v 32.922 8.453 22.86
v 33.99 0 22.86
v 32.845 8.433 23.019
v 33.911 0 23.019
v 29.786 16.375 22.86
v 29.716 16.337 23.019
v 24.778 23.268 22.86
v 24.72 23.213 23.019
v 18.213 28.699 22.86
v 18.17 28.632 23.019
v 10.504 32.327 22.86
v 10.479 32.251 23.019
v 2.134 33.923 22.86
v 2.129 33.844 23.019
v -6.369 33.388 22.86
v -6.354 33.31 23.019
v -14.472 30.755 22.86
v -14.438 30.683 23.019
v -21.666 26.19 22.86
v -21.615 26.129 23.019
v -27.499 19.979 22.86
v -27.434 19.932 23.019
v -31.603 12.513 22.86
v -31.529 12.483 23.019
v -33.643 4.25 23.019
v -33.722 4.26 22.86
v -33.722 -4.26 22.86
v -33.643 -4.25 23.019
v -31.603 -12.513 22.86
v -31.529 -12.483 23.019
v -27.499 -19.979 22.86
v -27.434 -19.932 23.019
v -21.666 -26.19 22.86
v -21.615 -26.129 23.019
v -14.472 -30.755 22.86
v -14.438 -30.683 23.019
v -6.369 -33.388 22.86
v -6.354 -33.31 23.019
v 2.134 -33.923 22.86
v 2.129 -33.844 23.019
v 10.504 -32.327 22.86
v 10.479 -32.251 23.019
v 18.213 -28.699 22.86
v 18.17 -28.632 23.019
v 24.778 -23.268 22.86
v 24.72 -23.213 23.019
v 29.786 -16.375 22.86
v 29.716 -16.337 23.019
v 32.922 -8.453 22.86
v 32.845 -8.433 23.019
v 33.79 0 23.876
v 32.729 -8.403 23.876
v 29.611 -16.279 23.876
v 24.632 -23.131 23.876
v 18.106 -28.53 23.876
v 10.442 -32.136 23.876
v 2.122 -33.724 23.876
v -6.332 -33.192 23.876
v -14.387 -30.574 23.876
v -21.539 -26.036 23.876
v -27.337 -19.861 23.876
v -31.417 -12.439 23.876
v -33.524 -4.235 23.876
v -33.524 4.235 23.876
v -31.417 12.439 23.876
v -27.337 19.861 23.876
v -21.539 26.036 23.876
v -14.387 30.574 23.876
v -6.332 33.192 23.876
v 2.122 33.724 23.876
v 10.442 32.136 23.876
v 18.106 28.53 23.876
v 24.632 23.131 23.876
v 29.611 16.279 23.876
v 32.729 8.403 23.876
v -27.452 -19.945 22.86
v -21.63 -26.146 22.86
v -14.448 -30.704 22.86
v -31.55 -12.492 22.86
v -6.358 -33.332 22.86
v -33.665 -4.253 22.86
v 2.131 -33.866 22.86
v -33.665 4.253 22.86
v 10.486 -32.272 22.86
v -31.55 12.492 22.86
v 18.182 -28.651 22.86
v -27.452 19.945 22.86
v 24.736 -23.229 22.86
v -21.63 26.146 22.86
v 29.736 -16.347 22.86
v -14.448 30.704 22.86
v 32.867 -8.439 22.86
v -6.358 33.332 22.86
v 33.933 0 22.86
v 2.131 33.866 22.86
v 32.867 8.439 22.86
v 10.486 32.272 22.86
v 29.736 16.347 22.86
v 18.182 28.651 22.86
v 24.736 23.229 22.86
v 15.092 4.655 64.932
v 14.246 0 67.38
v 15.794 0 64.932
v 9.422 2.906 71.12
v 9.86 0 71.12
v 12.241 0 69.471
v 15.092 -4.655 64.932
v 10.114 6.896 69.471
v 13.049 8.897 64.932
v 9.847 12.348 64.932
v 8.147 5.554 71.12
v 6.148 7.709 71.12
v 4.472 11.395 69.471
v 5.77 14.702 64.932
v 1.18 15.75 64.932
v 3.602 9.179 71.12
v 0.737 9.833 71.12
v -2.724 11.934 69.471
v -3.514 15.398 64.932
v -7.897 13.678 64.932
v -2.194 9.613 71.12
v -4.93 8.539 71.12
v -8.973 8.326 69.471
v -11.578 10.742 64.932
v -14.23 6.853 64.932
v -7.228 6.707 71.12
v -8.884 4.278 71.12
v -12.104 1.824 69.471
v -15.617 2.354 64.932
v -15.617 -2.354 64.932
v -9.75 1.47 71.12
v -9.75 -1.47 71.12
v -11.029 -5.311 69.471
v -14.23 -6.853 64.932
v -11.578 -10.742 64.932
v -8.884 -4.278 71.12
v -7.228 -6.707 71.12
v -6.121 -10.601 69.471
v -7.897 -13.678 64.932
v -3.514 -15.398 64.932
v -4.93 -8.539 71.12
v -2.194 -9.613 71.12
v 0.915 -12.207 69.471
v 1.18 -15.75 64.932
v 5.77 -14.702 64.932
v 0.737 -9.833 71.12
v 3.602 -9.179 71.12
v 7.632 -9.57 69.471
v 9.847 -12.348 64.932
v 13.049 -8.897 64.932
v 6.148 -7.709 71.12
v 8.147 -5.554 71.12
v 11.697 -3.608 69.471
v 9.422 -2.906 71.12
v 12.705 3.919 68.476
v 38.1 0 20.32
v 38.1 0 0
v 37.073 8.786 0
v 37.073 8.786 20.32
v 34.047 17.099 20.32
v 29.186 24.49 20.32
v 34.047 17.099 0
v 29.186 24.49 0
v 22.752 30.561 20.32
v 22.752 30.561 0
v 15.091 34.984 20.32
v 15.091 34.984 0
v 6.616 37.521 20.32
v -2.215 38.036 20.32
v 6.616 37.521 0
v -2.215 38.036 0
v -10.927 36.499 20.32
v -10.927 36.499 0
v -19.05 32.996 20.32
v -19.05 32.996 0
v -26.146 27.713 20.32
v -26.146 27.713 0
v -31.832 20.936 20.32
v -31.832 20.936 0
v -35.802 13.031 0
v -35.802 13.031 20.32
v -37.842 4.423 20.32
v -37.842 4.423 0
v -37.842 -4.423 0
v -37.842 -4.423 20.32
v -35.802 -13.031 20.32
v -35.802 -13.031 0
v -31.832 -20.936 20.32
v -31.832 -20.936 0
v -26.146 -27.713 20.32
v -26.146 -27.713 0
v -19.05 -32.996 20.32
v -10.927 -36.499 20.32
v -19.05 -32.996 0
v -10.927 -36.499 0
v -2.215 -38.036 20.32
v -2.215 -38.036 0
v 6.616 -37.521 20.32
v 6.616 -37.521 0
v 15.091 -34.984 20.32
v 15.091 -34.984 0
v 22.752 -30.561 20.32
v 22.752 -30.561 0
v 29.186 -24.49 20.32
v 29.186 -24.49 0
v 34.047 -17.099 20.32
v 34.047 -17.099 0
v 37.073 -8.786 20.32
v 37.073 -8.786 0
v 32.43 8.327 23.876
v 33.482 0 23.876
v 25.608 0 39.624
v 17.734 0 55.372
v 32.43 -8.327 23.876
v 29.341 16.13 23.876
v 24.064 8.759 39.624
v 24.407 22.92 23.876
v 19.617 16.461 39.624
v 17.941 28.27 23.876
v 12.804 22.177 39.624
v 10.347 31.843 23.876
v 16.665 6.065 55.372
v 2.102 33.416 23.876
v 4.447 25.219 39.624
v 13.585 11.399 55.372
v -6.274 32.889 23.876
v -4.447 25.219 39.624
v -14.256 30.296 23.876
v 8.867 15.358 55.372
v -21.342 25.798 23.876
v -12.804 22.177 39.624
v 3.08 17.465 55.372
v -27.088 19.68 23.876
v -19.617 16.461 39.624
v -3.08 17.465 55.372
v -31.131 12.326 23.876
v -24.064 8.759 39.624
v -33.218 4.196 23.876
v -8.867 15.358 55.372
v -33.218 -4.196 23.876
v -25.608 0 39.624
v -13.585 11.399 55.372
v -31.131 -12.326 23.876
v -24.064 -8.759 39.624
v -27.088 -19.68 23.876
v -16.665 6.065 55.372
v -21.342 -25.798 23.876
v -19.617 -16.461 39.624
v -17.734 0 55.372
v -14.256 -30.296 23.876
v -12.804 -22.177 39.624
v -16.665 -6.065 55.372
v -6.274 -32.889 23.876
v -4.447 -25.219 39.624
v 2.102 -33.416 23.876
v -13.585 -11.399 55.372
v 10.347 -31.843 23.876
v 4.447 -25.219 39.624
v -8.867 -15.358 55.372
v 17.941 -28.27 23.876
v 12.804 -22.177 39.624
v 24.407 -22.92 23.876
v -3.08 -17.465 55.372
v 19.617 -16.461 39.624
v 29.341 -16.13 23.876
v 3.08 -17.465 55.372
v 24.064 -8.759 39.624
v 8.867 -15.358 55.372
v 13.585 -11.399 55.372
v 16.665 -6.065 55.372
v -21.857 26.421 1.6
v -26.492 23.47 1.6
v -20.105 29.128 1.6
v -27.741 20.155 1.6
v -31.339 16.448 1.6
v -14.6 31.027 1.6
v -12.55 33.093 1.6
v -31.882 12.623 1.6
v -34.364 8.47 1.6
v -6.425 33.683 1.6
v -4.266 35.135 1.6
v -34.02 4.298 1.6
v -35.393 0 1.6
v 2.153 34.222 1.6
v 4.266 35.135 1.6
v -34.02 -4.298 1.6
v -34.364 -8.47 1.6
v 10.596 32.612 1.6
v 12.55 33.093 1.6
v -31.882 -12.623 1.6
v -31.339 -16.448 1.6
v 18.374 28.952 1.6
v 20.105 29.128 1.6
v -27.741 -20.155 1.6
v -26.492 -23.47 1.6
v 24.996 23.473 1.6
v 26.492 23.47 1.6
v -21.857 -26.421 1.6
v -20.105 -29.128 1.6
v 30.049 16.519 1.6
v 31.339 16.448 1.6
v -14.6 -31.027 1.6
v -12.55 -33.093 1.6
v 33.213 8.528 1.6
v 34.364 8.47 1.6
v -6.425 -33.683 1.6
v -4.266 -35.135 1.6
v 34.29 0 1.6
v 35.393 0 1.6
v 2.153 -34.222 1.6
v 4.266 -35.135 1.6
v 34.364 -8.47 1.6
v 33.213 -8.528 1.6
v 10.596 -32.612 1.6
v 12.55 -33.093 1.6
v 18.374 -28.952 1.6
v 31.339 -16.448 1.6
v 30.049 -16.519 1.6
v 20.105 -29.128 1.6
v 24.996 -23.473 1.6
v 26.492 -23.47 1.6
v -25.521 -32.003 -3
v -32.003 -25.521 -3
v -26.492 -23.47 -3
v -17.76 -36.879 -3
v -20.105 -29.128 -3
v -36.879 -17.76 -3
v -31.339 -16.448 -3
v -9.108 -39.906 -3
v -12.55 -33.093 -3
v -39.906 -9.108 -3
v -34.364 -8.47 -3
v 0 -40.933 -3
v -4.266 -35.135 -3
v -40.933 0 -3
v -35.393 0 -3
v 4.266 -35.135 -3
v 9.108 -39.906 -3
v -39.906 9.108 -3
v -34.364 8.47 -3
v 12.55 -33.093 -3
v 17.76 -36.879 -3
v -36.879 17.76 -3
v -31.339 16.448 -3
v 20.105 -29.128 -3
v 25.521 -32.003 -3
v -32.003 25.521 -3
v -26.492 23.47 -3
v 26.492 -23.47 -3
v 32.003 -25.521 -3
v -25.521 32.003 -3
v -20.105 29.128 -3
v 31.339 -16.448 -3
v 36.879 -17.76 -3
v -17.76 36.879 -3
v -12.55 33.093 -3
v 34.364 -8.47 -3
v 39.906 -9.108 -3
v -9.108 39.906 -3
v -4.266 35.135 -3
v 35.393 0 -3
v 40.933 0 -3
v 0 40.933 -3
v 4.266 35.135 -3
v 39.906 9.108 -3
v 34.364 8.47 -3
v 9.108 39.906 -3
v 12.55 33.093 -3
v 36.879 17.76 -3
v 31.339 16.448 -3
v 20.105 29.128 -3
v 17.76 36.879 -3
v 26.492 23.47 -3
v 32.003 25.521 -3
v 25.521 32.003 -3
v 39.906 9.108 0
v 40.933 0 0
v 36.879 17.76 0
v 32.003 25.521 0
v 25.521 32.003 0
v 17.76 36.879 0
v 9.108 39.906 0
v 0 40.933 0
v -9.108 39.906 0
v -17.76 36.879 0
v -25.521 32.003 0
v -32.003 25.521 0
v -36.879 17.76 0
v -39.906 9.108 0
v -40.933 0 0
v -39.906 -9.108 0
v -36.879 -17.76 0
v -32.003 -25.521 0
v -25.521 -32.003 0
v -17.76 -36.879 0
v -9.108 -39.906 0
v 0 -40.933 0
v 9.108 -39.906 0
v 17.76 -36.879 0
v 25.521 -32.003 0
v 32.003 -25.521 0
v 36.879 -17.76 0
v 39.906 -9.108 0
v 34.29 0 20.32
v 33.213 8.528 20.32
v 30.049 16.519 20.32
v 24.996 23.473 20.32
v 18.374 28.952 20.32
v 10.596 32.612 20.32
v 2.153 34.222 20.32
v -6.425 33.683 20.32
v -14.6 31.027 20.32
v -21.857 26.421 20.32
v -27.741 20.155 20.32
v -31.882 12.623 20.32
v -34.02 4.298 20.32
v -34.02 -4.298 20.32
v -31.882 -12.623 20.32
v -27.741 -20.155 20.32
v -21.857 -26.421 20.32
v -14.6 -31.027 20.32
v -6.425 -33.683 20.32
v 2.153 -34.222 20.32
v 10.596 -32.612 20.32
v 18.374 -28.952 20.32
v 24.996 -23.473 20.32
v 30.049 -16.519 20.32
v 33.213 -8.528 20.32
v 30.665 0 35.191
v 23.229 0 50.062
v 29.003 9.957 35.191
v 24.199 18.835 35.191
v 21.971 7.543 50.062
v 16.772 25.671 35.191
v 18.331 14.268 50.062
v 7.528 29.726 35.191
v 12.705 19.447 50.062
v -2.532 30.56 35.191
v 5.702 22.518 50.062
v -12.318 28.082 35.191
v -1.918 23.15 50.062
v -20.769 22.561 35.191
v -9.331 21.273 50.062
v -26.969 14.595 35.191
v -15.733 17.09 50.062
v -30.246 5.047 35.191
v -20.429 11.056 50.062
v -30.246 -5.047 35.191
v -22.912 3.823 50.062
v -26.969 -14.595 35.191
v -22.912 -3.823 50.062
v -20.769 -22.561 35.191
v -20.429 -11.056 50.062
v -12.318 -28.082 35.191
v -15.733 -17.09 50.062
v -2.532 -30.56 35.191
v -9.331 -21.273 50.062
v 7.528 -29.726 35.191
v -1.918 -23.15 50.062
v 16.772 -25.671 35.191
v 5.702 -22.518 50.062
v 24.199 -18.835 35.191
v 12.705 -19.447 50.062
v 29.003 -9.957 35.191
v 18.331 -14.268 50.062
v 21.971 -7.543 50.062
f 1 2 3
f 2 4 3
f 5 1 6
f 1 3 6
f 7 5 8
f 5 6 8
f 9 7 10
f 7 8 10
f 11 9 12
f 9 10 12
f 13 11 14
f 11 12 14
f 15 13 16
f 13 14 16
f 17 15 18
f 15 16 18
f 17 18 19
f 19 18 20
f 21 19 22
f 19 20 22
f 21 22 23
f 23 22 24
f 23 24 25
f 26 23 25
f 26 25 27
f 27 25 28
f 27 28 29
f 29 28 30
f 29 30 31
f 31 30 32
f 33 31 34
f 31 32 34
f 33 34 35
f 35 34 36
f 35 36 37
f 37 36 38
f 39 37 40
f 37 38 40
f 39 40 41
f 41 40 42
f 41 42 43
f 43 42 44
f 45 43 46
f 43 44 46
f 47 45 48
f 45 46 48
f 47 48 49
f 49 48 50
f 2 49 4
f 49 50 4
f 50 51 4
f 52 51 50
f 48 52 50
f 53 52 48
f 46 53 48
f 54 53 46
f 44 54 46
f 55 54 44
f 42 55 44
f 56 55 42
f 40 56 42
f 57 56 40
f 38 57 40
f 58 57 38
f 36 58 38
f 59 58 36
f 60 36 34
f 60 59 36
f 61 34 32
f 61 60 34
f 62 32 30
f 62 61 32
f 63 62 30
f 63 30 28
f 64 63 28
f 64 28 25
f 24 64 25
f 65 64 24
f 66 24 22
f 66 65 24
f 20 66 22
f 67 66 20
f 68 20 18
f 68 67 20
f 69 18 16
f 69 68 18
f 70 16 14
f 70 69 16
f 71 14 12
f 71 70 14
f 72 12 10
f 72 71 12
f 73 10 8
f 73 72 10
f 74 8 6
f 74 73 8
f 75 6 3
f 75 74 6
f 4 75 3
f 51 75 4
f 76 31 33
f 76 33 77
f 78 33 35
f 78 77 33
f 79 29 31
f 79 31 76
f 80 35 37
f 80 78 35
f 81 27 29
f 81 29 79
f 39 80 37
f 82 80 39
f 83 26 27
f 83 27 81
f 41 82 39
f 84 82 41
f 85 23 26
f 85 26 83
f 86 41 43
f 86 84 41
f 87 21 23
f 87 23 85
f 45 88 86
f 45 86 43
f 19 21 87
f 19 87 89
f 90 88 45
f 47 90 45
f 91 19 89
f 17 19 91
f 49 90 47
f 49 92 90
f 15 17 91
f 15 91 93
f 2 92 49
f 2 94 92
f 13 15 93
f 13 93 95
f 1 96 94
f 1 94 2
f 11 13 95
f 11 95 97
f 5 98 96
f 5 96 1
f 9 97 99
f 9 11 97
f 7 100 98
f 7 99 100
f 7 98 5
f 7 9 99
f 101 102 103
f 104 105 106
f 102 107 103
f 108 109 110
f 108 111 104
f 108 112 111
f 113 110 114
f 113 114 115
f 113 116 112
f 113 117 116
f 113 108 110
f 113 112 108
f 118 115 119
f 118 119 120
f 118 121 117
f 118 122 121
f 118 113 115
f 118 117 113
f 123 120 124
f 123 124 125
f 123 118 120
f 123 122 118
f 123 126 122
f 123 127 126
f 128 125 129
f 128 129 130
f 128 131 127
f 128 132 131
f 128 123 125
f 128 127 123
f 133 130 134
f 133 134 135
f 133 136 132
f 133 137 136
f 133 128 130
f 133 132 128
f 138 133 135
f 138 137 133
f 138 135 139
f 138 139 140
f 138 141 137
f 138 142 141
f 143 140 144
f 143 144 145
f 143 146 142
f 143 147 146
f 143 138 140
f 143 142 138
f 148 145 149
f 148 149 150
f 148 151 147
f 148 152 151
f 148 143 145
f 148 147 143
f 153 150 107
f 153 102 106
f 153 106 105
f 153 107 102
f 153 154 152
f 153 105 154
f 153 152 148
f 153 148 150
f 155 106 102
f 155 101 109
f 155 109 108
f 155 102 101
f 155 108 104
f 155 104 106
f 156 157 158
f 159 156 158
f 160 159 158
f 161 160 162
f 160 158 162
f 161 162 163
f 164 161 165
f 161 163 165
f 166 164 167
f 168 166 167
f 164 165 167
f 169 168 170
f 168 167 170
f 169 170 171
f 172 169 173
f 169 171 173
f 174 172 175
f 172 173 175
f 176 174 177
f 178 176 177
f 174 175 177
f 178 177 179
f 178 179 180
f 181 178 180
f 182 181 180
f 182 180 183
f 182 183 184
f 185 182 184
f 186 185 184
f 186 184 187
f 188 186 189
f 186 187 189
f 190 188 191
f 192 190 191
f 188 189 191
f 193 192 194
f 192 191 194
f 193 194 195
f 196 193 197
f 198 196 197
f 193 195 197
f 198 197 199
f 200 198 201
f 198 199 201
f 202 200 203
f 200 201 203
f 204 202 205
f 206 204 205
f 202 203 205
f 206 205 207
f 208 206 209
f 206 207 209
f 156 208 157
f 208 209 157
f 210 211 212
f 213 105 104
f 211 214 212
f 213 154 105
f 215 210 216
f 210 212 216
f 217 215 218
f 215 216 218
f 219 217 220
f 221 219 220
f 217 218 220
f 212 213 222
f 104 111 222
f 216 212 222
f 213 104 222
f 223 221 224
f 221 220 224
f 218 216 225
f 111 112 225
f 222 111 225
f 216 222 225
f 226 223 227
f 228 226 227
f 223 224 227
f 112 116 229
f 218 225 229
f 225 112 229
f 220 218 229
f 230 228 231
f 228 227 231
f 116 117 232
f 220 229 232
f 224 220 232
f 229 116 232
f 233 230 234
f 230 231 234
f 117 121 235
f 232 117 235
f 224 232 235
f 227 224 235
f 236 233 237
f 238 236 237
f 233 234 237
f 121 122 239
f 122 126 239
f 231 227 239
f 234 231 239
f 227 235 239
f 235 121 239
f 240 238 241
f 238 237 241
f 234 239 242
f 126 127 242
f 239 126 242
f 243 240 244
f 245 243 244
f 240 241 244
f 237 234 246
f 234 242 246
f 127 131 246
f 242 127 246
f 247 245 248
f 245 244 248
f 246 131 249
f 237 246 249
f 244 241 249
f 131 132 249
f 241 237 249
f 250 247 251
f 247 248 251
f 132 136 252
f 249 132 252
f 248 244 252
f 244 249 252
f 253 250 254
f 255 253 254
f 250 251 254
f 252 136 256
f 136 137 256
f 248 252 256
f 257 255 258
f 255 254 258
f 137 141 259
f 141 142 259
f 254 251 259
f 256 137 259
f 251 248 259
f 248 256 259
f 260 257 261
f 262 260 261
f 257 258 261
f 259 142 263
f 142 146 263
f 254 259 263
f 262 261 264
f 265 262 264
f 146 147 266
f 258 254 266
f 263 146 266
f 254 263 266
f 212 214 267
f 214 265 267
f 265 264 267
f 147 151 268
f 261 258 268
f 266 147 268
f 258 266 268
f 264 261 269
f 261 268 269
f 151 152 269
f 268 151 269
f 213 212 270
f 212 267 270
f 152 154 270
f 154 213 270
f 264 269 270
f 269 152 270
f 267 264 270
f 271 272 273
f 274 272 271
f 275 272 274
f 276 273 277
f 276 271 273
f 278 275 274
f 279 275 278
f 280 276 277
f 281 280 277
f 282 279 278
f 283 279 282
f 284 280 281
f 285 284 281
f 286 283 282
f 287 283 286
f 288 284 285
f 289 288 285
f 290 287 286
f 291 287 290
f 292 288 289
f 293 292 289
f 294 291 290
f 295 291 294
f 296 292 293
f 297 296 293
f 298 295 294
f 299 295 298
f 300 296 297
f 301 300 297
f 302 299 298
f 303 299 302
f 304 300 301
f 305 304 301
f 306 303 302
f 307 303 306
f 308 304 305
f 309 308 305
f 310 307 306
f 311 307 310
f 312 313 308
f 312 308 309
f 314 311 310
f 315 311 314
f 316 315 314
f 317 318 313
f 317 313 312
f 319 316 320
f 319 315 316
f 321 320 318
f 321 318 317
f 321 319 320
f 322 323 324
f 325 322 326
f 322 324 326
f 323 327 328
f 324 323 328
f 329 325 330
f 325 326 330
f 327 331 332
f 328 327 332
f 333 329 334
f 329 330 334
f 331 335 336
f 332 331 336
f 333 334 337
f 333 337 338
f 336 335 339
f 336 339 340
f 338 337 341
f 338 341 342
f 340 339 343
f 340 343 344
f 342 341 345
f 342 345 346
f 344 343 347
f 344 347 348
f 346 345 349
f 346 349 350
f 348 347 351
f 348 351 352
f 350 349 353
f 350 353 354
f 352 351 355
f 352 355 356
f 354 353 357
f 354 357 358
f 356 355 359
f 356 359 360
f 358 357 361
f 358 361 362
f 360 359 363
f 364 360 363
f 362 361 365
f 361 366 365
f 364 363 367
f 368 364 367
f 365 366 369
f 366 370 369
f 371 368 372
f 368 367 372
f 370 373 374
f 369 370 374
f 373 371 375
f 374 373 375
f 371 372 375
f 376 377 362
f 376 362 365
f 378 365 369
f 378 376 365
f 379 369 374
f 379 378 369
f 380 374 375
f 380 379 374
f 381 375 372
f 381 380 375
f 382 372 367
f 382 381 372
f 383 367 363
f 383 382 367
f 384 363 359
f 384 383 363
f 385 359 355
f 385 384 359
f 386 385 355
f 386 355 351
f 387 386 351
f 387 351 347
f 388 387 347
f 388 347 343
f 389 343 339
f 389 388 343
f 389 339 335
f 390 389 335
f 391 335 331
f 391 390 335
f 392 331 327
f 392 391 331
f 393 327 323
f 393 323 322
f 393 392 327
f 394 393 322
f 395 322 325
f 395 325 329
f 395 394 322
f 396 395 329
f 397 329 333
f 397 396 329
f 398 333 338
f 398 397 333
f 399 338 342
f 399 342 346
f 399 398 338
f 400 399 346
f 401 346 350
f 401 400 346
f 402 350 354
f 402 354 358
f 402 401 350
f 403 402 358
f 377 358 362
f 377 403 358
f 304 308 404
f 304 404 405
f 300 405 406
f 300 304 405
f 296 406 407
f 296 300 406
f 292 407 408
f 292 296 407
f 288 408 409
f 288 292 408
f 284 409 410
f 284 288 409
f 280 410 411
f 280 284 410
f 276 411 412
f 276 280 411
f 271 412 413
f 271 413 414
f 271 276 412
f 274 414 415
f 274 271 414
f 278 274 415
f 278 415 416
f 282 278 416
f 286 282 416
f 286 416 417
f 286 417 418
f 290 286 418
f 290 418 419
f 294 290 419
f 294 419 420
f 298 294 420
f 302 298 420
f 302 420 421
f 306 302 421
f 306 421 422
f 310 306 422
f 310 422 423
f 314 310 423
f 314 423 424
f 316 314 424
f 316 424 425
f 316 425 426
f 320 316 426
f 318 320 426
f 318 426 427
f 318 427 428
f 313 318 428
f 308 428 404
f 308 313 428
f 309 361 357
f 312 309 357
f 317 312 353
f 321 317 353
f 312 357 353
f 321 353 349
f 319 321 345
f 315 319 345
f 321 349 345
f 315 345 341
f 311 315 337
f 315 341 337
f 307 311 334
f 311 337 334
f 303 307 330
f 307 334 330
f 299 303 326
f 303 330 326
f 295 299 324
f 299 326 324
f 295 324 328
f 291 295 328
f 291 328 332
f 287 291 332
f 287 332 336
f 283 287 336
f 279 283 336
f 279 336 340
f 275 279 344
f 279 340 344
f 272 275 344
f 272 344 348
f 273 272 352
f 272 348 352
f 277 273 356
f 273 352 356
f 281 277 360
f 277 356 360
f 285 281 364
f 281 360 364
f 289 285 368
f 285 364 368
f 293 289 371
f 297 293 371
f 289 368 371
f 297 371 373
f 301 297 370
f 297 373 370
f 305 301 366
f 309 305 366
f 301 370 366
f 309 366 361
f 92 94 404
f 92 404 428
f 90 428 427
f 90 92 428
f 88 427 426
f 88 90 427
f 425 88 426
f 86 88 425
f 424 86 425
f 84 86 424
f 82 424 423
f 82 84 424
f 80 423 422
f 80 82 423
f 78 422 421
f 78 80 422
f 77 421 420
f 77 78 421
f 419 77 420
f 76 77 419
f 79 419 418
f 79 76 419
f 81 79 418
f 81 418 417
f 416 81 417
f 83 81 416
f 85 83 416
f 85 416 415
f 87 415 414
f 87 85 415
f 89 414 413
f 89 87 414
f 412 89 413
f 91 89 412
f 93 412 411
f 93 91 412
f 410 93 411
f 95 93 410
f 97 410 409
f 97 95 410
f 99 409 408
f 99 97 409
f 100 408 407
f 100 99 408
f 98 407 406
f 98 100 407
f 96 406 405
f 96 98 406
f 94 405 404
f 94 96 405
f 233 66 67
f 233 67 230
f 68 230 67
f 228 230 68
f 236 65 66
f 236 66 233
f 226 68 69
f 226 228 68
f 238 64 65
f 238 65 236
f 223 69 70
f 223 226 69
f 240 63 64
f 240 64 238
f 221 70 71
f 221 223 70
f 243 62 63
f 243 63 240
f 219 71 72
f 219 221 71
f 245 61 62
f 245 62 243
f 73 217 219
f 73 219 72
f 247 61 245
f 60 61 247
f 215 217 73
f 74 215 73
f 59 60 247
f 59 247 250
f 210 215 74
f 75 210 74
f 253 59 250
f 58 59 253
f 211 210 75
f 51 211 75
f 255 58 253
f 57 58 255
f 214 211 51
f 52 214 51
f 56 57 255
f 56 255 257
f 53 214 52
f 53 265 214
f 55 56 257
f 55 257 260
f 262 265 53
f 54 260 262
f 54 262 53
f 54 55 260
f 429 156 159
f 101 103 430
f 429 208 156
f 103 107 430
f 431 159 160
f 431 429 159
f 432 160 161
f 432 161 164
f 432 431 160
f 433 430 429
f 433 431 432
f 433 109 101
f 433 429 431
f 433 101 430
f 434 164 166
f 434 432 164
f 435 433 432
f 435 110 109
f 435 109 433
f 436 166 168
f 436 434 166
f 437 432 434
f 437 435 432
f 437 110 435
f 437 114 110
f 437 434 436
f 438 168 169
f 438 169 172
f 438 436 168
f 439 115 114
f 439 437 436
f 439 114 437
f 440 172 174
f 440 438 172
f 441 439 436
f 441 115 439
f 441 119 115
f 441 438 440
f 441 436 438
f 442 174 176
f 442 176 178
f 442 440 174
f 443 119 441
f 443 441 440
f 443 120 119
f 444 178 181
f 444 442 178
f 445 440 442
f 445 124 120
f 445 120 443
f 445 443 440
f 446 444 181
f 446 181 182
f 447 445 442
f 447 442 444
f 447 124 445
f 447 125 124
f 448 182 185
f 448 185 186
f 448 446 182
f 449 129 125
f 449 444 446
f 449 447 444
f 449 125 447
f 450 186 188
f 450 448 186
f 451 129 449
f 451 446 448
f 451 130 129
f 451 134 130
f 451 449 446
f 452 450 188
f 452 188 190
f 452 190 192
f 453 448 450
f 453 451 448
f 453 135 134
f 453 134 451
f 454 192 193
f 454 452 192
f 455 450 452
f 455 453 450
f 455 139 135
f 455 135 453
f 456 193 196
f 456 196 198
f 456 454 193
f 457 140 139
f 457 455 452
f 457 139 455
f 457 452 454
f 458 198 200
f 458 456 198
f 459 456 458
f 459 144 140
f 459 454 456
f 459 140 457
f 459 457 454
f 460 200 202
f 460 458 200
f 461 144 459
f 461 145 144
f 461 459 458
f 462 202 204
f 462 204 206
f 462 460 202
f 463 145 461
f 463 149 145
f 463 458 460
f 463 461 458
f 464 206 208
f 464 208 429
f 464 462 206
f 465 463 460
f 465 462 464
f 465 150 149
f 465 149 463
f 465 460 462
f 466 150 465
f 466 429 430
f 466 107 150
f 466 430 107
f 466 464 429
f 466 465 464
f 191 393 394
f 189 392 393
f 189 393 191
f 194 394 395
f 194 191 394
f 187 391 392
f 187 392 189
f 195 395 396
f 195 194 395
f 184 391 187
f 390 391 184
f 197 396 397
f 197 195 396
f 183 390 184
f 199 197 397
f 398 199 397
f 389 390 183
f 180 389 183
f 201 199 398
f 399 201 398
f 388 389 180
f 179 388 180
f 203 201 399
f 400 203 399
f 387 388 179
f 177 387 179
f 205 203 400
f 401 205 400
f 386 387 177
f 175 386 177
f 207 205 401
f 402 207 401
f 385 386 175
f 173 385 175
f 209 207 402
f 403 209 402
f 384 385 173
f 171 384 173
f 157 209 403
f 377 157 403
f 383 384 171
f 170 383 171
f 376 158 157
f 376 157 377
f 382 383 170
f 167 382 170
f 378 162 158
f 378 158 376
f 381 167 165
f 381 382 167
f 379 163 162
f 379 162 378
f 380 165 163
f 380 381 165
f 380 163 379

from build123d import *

# Parameters (mm, degrees)
F0_R      = 38.1
F0_R_2    = 34.29
F1_DEPTH  = 20.32
F4_R      = 38.1
F3_R      = 12.7
F6_T      = -2.54
F5_FACE_R = 34.29
F7_DEPTH  = 3.556
F7_TAPER  = 8
F9_R      = 40.932761629
F10_DEPTH = 3
F11_R     = 35.392761629
F12_DEPTH = 4.6


# Not quite as in the source:
# - a fillet or chamfer that OpenCascade refuses, or shapes differently, is made with other operations: its cross-section is extruded or revolved along the edge and cut away or added


with BuildPart() as f1:
    # F0 (on Top) → F1 (new body)
    with BuildSketch(Plane.XY):
        Circle(F0_R)
        Circle(F0_R_2, mode=Mode.SUBTRACT)
    extrude(amount=F1_DEPTH)

    # F4 (on face) → F5 section 0
    with BuildSketch(Plane.XY.offset(20.32)):
        Circle(F4_R)
    # F3 (on offset) → F5 section 1
    with BuildSketch(Plane.XY.offset(71.12)):
        Circle(F3_R)
    loft()

    # F6
    f6_openings = [f1.faces().sort_by_distance(p)[0] for p in [
        (0, 0, 71.12),
    ]]
    offset(amount=F6_T, openings=f6_openings, kind=Kind.INTERSECTION)

    # F5_face (on face) → F7 (cut)
    with BuildSketch(Plane(origin=(0, 0, 20.32), x_dir=(1, 0, 0), z_dir=(0, 0, -1))):
        Circle(F5_FACE_R)
    extrude(amount=-F7_DEPTH, taper=F7_TAPER, mode=Mode.SUBTRACT)

    # F8: fillet of radius 14.4671225158 on 1 edges, made by hand

    # F8_s1 → F8_t2 (revolve, cut)
    with BuildSketch(Plane.XZ):
        with BuildLine():
            ThreePointArc((15.7937700832, 64.9324598335), (13.2958276301, 68.4758321875), (9.8601936686, 71.12))
            Line((9.8601936686, 71.12), (12.7, 71.12))
            Line((12.7, 71.12), (15.7937700832, 64.9324598335))
        make_face()
    revolve(axis=Axis((0, 0, 71.12), (0, 0, 1)), mode=Mode.SUBTRACT)

    # F9 (on Top) → F10 (join)
    with BuildSketch(Plane.XY):
        Circle(F9_R)
    extrude(amount=-F10_DEPTH)

    # F11 (on face) → F12 (cut)
    with BuildSketch(Plane(origin=(0, 0, -3), x_dir=(1, 0, 0), z_dir=(0, 0, -1))):
        Circle(F11_R)
    extrude(amount=-F12_DEPTH, mode=Mode.SUBTRACT)


solid = f1.part
